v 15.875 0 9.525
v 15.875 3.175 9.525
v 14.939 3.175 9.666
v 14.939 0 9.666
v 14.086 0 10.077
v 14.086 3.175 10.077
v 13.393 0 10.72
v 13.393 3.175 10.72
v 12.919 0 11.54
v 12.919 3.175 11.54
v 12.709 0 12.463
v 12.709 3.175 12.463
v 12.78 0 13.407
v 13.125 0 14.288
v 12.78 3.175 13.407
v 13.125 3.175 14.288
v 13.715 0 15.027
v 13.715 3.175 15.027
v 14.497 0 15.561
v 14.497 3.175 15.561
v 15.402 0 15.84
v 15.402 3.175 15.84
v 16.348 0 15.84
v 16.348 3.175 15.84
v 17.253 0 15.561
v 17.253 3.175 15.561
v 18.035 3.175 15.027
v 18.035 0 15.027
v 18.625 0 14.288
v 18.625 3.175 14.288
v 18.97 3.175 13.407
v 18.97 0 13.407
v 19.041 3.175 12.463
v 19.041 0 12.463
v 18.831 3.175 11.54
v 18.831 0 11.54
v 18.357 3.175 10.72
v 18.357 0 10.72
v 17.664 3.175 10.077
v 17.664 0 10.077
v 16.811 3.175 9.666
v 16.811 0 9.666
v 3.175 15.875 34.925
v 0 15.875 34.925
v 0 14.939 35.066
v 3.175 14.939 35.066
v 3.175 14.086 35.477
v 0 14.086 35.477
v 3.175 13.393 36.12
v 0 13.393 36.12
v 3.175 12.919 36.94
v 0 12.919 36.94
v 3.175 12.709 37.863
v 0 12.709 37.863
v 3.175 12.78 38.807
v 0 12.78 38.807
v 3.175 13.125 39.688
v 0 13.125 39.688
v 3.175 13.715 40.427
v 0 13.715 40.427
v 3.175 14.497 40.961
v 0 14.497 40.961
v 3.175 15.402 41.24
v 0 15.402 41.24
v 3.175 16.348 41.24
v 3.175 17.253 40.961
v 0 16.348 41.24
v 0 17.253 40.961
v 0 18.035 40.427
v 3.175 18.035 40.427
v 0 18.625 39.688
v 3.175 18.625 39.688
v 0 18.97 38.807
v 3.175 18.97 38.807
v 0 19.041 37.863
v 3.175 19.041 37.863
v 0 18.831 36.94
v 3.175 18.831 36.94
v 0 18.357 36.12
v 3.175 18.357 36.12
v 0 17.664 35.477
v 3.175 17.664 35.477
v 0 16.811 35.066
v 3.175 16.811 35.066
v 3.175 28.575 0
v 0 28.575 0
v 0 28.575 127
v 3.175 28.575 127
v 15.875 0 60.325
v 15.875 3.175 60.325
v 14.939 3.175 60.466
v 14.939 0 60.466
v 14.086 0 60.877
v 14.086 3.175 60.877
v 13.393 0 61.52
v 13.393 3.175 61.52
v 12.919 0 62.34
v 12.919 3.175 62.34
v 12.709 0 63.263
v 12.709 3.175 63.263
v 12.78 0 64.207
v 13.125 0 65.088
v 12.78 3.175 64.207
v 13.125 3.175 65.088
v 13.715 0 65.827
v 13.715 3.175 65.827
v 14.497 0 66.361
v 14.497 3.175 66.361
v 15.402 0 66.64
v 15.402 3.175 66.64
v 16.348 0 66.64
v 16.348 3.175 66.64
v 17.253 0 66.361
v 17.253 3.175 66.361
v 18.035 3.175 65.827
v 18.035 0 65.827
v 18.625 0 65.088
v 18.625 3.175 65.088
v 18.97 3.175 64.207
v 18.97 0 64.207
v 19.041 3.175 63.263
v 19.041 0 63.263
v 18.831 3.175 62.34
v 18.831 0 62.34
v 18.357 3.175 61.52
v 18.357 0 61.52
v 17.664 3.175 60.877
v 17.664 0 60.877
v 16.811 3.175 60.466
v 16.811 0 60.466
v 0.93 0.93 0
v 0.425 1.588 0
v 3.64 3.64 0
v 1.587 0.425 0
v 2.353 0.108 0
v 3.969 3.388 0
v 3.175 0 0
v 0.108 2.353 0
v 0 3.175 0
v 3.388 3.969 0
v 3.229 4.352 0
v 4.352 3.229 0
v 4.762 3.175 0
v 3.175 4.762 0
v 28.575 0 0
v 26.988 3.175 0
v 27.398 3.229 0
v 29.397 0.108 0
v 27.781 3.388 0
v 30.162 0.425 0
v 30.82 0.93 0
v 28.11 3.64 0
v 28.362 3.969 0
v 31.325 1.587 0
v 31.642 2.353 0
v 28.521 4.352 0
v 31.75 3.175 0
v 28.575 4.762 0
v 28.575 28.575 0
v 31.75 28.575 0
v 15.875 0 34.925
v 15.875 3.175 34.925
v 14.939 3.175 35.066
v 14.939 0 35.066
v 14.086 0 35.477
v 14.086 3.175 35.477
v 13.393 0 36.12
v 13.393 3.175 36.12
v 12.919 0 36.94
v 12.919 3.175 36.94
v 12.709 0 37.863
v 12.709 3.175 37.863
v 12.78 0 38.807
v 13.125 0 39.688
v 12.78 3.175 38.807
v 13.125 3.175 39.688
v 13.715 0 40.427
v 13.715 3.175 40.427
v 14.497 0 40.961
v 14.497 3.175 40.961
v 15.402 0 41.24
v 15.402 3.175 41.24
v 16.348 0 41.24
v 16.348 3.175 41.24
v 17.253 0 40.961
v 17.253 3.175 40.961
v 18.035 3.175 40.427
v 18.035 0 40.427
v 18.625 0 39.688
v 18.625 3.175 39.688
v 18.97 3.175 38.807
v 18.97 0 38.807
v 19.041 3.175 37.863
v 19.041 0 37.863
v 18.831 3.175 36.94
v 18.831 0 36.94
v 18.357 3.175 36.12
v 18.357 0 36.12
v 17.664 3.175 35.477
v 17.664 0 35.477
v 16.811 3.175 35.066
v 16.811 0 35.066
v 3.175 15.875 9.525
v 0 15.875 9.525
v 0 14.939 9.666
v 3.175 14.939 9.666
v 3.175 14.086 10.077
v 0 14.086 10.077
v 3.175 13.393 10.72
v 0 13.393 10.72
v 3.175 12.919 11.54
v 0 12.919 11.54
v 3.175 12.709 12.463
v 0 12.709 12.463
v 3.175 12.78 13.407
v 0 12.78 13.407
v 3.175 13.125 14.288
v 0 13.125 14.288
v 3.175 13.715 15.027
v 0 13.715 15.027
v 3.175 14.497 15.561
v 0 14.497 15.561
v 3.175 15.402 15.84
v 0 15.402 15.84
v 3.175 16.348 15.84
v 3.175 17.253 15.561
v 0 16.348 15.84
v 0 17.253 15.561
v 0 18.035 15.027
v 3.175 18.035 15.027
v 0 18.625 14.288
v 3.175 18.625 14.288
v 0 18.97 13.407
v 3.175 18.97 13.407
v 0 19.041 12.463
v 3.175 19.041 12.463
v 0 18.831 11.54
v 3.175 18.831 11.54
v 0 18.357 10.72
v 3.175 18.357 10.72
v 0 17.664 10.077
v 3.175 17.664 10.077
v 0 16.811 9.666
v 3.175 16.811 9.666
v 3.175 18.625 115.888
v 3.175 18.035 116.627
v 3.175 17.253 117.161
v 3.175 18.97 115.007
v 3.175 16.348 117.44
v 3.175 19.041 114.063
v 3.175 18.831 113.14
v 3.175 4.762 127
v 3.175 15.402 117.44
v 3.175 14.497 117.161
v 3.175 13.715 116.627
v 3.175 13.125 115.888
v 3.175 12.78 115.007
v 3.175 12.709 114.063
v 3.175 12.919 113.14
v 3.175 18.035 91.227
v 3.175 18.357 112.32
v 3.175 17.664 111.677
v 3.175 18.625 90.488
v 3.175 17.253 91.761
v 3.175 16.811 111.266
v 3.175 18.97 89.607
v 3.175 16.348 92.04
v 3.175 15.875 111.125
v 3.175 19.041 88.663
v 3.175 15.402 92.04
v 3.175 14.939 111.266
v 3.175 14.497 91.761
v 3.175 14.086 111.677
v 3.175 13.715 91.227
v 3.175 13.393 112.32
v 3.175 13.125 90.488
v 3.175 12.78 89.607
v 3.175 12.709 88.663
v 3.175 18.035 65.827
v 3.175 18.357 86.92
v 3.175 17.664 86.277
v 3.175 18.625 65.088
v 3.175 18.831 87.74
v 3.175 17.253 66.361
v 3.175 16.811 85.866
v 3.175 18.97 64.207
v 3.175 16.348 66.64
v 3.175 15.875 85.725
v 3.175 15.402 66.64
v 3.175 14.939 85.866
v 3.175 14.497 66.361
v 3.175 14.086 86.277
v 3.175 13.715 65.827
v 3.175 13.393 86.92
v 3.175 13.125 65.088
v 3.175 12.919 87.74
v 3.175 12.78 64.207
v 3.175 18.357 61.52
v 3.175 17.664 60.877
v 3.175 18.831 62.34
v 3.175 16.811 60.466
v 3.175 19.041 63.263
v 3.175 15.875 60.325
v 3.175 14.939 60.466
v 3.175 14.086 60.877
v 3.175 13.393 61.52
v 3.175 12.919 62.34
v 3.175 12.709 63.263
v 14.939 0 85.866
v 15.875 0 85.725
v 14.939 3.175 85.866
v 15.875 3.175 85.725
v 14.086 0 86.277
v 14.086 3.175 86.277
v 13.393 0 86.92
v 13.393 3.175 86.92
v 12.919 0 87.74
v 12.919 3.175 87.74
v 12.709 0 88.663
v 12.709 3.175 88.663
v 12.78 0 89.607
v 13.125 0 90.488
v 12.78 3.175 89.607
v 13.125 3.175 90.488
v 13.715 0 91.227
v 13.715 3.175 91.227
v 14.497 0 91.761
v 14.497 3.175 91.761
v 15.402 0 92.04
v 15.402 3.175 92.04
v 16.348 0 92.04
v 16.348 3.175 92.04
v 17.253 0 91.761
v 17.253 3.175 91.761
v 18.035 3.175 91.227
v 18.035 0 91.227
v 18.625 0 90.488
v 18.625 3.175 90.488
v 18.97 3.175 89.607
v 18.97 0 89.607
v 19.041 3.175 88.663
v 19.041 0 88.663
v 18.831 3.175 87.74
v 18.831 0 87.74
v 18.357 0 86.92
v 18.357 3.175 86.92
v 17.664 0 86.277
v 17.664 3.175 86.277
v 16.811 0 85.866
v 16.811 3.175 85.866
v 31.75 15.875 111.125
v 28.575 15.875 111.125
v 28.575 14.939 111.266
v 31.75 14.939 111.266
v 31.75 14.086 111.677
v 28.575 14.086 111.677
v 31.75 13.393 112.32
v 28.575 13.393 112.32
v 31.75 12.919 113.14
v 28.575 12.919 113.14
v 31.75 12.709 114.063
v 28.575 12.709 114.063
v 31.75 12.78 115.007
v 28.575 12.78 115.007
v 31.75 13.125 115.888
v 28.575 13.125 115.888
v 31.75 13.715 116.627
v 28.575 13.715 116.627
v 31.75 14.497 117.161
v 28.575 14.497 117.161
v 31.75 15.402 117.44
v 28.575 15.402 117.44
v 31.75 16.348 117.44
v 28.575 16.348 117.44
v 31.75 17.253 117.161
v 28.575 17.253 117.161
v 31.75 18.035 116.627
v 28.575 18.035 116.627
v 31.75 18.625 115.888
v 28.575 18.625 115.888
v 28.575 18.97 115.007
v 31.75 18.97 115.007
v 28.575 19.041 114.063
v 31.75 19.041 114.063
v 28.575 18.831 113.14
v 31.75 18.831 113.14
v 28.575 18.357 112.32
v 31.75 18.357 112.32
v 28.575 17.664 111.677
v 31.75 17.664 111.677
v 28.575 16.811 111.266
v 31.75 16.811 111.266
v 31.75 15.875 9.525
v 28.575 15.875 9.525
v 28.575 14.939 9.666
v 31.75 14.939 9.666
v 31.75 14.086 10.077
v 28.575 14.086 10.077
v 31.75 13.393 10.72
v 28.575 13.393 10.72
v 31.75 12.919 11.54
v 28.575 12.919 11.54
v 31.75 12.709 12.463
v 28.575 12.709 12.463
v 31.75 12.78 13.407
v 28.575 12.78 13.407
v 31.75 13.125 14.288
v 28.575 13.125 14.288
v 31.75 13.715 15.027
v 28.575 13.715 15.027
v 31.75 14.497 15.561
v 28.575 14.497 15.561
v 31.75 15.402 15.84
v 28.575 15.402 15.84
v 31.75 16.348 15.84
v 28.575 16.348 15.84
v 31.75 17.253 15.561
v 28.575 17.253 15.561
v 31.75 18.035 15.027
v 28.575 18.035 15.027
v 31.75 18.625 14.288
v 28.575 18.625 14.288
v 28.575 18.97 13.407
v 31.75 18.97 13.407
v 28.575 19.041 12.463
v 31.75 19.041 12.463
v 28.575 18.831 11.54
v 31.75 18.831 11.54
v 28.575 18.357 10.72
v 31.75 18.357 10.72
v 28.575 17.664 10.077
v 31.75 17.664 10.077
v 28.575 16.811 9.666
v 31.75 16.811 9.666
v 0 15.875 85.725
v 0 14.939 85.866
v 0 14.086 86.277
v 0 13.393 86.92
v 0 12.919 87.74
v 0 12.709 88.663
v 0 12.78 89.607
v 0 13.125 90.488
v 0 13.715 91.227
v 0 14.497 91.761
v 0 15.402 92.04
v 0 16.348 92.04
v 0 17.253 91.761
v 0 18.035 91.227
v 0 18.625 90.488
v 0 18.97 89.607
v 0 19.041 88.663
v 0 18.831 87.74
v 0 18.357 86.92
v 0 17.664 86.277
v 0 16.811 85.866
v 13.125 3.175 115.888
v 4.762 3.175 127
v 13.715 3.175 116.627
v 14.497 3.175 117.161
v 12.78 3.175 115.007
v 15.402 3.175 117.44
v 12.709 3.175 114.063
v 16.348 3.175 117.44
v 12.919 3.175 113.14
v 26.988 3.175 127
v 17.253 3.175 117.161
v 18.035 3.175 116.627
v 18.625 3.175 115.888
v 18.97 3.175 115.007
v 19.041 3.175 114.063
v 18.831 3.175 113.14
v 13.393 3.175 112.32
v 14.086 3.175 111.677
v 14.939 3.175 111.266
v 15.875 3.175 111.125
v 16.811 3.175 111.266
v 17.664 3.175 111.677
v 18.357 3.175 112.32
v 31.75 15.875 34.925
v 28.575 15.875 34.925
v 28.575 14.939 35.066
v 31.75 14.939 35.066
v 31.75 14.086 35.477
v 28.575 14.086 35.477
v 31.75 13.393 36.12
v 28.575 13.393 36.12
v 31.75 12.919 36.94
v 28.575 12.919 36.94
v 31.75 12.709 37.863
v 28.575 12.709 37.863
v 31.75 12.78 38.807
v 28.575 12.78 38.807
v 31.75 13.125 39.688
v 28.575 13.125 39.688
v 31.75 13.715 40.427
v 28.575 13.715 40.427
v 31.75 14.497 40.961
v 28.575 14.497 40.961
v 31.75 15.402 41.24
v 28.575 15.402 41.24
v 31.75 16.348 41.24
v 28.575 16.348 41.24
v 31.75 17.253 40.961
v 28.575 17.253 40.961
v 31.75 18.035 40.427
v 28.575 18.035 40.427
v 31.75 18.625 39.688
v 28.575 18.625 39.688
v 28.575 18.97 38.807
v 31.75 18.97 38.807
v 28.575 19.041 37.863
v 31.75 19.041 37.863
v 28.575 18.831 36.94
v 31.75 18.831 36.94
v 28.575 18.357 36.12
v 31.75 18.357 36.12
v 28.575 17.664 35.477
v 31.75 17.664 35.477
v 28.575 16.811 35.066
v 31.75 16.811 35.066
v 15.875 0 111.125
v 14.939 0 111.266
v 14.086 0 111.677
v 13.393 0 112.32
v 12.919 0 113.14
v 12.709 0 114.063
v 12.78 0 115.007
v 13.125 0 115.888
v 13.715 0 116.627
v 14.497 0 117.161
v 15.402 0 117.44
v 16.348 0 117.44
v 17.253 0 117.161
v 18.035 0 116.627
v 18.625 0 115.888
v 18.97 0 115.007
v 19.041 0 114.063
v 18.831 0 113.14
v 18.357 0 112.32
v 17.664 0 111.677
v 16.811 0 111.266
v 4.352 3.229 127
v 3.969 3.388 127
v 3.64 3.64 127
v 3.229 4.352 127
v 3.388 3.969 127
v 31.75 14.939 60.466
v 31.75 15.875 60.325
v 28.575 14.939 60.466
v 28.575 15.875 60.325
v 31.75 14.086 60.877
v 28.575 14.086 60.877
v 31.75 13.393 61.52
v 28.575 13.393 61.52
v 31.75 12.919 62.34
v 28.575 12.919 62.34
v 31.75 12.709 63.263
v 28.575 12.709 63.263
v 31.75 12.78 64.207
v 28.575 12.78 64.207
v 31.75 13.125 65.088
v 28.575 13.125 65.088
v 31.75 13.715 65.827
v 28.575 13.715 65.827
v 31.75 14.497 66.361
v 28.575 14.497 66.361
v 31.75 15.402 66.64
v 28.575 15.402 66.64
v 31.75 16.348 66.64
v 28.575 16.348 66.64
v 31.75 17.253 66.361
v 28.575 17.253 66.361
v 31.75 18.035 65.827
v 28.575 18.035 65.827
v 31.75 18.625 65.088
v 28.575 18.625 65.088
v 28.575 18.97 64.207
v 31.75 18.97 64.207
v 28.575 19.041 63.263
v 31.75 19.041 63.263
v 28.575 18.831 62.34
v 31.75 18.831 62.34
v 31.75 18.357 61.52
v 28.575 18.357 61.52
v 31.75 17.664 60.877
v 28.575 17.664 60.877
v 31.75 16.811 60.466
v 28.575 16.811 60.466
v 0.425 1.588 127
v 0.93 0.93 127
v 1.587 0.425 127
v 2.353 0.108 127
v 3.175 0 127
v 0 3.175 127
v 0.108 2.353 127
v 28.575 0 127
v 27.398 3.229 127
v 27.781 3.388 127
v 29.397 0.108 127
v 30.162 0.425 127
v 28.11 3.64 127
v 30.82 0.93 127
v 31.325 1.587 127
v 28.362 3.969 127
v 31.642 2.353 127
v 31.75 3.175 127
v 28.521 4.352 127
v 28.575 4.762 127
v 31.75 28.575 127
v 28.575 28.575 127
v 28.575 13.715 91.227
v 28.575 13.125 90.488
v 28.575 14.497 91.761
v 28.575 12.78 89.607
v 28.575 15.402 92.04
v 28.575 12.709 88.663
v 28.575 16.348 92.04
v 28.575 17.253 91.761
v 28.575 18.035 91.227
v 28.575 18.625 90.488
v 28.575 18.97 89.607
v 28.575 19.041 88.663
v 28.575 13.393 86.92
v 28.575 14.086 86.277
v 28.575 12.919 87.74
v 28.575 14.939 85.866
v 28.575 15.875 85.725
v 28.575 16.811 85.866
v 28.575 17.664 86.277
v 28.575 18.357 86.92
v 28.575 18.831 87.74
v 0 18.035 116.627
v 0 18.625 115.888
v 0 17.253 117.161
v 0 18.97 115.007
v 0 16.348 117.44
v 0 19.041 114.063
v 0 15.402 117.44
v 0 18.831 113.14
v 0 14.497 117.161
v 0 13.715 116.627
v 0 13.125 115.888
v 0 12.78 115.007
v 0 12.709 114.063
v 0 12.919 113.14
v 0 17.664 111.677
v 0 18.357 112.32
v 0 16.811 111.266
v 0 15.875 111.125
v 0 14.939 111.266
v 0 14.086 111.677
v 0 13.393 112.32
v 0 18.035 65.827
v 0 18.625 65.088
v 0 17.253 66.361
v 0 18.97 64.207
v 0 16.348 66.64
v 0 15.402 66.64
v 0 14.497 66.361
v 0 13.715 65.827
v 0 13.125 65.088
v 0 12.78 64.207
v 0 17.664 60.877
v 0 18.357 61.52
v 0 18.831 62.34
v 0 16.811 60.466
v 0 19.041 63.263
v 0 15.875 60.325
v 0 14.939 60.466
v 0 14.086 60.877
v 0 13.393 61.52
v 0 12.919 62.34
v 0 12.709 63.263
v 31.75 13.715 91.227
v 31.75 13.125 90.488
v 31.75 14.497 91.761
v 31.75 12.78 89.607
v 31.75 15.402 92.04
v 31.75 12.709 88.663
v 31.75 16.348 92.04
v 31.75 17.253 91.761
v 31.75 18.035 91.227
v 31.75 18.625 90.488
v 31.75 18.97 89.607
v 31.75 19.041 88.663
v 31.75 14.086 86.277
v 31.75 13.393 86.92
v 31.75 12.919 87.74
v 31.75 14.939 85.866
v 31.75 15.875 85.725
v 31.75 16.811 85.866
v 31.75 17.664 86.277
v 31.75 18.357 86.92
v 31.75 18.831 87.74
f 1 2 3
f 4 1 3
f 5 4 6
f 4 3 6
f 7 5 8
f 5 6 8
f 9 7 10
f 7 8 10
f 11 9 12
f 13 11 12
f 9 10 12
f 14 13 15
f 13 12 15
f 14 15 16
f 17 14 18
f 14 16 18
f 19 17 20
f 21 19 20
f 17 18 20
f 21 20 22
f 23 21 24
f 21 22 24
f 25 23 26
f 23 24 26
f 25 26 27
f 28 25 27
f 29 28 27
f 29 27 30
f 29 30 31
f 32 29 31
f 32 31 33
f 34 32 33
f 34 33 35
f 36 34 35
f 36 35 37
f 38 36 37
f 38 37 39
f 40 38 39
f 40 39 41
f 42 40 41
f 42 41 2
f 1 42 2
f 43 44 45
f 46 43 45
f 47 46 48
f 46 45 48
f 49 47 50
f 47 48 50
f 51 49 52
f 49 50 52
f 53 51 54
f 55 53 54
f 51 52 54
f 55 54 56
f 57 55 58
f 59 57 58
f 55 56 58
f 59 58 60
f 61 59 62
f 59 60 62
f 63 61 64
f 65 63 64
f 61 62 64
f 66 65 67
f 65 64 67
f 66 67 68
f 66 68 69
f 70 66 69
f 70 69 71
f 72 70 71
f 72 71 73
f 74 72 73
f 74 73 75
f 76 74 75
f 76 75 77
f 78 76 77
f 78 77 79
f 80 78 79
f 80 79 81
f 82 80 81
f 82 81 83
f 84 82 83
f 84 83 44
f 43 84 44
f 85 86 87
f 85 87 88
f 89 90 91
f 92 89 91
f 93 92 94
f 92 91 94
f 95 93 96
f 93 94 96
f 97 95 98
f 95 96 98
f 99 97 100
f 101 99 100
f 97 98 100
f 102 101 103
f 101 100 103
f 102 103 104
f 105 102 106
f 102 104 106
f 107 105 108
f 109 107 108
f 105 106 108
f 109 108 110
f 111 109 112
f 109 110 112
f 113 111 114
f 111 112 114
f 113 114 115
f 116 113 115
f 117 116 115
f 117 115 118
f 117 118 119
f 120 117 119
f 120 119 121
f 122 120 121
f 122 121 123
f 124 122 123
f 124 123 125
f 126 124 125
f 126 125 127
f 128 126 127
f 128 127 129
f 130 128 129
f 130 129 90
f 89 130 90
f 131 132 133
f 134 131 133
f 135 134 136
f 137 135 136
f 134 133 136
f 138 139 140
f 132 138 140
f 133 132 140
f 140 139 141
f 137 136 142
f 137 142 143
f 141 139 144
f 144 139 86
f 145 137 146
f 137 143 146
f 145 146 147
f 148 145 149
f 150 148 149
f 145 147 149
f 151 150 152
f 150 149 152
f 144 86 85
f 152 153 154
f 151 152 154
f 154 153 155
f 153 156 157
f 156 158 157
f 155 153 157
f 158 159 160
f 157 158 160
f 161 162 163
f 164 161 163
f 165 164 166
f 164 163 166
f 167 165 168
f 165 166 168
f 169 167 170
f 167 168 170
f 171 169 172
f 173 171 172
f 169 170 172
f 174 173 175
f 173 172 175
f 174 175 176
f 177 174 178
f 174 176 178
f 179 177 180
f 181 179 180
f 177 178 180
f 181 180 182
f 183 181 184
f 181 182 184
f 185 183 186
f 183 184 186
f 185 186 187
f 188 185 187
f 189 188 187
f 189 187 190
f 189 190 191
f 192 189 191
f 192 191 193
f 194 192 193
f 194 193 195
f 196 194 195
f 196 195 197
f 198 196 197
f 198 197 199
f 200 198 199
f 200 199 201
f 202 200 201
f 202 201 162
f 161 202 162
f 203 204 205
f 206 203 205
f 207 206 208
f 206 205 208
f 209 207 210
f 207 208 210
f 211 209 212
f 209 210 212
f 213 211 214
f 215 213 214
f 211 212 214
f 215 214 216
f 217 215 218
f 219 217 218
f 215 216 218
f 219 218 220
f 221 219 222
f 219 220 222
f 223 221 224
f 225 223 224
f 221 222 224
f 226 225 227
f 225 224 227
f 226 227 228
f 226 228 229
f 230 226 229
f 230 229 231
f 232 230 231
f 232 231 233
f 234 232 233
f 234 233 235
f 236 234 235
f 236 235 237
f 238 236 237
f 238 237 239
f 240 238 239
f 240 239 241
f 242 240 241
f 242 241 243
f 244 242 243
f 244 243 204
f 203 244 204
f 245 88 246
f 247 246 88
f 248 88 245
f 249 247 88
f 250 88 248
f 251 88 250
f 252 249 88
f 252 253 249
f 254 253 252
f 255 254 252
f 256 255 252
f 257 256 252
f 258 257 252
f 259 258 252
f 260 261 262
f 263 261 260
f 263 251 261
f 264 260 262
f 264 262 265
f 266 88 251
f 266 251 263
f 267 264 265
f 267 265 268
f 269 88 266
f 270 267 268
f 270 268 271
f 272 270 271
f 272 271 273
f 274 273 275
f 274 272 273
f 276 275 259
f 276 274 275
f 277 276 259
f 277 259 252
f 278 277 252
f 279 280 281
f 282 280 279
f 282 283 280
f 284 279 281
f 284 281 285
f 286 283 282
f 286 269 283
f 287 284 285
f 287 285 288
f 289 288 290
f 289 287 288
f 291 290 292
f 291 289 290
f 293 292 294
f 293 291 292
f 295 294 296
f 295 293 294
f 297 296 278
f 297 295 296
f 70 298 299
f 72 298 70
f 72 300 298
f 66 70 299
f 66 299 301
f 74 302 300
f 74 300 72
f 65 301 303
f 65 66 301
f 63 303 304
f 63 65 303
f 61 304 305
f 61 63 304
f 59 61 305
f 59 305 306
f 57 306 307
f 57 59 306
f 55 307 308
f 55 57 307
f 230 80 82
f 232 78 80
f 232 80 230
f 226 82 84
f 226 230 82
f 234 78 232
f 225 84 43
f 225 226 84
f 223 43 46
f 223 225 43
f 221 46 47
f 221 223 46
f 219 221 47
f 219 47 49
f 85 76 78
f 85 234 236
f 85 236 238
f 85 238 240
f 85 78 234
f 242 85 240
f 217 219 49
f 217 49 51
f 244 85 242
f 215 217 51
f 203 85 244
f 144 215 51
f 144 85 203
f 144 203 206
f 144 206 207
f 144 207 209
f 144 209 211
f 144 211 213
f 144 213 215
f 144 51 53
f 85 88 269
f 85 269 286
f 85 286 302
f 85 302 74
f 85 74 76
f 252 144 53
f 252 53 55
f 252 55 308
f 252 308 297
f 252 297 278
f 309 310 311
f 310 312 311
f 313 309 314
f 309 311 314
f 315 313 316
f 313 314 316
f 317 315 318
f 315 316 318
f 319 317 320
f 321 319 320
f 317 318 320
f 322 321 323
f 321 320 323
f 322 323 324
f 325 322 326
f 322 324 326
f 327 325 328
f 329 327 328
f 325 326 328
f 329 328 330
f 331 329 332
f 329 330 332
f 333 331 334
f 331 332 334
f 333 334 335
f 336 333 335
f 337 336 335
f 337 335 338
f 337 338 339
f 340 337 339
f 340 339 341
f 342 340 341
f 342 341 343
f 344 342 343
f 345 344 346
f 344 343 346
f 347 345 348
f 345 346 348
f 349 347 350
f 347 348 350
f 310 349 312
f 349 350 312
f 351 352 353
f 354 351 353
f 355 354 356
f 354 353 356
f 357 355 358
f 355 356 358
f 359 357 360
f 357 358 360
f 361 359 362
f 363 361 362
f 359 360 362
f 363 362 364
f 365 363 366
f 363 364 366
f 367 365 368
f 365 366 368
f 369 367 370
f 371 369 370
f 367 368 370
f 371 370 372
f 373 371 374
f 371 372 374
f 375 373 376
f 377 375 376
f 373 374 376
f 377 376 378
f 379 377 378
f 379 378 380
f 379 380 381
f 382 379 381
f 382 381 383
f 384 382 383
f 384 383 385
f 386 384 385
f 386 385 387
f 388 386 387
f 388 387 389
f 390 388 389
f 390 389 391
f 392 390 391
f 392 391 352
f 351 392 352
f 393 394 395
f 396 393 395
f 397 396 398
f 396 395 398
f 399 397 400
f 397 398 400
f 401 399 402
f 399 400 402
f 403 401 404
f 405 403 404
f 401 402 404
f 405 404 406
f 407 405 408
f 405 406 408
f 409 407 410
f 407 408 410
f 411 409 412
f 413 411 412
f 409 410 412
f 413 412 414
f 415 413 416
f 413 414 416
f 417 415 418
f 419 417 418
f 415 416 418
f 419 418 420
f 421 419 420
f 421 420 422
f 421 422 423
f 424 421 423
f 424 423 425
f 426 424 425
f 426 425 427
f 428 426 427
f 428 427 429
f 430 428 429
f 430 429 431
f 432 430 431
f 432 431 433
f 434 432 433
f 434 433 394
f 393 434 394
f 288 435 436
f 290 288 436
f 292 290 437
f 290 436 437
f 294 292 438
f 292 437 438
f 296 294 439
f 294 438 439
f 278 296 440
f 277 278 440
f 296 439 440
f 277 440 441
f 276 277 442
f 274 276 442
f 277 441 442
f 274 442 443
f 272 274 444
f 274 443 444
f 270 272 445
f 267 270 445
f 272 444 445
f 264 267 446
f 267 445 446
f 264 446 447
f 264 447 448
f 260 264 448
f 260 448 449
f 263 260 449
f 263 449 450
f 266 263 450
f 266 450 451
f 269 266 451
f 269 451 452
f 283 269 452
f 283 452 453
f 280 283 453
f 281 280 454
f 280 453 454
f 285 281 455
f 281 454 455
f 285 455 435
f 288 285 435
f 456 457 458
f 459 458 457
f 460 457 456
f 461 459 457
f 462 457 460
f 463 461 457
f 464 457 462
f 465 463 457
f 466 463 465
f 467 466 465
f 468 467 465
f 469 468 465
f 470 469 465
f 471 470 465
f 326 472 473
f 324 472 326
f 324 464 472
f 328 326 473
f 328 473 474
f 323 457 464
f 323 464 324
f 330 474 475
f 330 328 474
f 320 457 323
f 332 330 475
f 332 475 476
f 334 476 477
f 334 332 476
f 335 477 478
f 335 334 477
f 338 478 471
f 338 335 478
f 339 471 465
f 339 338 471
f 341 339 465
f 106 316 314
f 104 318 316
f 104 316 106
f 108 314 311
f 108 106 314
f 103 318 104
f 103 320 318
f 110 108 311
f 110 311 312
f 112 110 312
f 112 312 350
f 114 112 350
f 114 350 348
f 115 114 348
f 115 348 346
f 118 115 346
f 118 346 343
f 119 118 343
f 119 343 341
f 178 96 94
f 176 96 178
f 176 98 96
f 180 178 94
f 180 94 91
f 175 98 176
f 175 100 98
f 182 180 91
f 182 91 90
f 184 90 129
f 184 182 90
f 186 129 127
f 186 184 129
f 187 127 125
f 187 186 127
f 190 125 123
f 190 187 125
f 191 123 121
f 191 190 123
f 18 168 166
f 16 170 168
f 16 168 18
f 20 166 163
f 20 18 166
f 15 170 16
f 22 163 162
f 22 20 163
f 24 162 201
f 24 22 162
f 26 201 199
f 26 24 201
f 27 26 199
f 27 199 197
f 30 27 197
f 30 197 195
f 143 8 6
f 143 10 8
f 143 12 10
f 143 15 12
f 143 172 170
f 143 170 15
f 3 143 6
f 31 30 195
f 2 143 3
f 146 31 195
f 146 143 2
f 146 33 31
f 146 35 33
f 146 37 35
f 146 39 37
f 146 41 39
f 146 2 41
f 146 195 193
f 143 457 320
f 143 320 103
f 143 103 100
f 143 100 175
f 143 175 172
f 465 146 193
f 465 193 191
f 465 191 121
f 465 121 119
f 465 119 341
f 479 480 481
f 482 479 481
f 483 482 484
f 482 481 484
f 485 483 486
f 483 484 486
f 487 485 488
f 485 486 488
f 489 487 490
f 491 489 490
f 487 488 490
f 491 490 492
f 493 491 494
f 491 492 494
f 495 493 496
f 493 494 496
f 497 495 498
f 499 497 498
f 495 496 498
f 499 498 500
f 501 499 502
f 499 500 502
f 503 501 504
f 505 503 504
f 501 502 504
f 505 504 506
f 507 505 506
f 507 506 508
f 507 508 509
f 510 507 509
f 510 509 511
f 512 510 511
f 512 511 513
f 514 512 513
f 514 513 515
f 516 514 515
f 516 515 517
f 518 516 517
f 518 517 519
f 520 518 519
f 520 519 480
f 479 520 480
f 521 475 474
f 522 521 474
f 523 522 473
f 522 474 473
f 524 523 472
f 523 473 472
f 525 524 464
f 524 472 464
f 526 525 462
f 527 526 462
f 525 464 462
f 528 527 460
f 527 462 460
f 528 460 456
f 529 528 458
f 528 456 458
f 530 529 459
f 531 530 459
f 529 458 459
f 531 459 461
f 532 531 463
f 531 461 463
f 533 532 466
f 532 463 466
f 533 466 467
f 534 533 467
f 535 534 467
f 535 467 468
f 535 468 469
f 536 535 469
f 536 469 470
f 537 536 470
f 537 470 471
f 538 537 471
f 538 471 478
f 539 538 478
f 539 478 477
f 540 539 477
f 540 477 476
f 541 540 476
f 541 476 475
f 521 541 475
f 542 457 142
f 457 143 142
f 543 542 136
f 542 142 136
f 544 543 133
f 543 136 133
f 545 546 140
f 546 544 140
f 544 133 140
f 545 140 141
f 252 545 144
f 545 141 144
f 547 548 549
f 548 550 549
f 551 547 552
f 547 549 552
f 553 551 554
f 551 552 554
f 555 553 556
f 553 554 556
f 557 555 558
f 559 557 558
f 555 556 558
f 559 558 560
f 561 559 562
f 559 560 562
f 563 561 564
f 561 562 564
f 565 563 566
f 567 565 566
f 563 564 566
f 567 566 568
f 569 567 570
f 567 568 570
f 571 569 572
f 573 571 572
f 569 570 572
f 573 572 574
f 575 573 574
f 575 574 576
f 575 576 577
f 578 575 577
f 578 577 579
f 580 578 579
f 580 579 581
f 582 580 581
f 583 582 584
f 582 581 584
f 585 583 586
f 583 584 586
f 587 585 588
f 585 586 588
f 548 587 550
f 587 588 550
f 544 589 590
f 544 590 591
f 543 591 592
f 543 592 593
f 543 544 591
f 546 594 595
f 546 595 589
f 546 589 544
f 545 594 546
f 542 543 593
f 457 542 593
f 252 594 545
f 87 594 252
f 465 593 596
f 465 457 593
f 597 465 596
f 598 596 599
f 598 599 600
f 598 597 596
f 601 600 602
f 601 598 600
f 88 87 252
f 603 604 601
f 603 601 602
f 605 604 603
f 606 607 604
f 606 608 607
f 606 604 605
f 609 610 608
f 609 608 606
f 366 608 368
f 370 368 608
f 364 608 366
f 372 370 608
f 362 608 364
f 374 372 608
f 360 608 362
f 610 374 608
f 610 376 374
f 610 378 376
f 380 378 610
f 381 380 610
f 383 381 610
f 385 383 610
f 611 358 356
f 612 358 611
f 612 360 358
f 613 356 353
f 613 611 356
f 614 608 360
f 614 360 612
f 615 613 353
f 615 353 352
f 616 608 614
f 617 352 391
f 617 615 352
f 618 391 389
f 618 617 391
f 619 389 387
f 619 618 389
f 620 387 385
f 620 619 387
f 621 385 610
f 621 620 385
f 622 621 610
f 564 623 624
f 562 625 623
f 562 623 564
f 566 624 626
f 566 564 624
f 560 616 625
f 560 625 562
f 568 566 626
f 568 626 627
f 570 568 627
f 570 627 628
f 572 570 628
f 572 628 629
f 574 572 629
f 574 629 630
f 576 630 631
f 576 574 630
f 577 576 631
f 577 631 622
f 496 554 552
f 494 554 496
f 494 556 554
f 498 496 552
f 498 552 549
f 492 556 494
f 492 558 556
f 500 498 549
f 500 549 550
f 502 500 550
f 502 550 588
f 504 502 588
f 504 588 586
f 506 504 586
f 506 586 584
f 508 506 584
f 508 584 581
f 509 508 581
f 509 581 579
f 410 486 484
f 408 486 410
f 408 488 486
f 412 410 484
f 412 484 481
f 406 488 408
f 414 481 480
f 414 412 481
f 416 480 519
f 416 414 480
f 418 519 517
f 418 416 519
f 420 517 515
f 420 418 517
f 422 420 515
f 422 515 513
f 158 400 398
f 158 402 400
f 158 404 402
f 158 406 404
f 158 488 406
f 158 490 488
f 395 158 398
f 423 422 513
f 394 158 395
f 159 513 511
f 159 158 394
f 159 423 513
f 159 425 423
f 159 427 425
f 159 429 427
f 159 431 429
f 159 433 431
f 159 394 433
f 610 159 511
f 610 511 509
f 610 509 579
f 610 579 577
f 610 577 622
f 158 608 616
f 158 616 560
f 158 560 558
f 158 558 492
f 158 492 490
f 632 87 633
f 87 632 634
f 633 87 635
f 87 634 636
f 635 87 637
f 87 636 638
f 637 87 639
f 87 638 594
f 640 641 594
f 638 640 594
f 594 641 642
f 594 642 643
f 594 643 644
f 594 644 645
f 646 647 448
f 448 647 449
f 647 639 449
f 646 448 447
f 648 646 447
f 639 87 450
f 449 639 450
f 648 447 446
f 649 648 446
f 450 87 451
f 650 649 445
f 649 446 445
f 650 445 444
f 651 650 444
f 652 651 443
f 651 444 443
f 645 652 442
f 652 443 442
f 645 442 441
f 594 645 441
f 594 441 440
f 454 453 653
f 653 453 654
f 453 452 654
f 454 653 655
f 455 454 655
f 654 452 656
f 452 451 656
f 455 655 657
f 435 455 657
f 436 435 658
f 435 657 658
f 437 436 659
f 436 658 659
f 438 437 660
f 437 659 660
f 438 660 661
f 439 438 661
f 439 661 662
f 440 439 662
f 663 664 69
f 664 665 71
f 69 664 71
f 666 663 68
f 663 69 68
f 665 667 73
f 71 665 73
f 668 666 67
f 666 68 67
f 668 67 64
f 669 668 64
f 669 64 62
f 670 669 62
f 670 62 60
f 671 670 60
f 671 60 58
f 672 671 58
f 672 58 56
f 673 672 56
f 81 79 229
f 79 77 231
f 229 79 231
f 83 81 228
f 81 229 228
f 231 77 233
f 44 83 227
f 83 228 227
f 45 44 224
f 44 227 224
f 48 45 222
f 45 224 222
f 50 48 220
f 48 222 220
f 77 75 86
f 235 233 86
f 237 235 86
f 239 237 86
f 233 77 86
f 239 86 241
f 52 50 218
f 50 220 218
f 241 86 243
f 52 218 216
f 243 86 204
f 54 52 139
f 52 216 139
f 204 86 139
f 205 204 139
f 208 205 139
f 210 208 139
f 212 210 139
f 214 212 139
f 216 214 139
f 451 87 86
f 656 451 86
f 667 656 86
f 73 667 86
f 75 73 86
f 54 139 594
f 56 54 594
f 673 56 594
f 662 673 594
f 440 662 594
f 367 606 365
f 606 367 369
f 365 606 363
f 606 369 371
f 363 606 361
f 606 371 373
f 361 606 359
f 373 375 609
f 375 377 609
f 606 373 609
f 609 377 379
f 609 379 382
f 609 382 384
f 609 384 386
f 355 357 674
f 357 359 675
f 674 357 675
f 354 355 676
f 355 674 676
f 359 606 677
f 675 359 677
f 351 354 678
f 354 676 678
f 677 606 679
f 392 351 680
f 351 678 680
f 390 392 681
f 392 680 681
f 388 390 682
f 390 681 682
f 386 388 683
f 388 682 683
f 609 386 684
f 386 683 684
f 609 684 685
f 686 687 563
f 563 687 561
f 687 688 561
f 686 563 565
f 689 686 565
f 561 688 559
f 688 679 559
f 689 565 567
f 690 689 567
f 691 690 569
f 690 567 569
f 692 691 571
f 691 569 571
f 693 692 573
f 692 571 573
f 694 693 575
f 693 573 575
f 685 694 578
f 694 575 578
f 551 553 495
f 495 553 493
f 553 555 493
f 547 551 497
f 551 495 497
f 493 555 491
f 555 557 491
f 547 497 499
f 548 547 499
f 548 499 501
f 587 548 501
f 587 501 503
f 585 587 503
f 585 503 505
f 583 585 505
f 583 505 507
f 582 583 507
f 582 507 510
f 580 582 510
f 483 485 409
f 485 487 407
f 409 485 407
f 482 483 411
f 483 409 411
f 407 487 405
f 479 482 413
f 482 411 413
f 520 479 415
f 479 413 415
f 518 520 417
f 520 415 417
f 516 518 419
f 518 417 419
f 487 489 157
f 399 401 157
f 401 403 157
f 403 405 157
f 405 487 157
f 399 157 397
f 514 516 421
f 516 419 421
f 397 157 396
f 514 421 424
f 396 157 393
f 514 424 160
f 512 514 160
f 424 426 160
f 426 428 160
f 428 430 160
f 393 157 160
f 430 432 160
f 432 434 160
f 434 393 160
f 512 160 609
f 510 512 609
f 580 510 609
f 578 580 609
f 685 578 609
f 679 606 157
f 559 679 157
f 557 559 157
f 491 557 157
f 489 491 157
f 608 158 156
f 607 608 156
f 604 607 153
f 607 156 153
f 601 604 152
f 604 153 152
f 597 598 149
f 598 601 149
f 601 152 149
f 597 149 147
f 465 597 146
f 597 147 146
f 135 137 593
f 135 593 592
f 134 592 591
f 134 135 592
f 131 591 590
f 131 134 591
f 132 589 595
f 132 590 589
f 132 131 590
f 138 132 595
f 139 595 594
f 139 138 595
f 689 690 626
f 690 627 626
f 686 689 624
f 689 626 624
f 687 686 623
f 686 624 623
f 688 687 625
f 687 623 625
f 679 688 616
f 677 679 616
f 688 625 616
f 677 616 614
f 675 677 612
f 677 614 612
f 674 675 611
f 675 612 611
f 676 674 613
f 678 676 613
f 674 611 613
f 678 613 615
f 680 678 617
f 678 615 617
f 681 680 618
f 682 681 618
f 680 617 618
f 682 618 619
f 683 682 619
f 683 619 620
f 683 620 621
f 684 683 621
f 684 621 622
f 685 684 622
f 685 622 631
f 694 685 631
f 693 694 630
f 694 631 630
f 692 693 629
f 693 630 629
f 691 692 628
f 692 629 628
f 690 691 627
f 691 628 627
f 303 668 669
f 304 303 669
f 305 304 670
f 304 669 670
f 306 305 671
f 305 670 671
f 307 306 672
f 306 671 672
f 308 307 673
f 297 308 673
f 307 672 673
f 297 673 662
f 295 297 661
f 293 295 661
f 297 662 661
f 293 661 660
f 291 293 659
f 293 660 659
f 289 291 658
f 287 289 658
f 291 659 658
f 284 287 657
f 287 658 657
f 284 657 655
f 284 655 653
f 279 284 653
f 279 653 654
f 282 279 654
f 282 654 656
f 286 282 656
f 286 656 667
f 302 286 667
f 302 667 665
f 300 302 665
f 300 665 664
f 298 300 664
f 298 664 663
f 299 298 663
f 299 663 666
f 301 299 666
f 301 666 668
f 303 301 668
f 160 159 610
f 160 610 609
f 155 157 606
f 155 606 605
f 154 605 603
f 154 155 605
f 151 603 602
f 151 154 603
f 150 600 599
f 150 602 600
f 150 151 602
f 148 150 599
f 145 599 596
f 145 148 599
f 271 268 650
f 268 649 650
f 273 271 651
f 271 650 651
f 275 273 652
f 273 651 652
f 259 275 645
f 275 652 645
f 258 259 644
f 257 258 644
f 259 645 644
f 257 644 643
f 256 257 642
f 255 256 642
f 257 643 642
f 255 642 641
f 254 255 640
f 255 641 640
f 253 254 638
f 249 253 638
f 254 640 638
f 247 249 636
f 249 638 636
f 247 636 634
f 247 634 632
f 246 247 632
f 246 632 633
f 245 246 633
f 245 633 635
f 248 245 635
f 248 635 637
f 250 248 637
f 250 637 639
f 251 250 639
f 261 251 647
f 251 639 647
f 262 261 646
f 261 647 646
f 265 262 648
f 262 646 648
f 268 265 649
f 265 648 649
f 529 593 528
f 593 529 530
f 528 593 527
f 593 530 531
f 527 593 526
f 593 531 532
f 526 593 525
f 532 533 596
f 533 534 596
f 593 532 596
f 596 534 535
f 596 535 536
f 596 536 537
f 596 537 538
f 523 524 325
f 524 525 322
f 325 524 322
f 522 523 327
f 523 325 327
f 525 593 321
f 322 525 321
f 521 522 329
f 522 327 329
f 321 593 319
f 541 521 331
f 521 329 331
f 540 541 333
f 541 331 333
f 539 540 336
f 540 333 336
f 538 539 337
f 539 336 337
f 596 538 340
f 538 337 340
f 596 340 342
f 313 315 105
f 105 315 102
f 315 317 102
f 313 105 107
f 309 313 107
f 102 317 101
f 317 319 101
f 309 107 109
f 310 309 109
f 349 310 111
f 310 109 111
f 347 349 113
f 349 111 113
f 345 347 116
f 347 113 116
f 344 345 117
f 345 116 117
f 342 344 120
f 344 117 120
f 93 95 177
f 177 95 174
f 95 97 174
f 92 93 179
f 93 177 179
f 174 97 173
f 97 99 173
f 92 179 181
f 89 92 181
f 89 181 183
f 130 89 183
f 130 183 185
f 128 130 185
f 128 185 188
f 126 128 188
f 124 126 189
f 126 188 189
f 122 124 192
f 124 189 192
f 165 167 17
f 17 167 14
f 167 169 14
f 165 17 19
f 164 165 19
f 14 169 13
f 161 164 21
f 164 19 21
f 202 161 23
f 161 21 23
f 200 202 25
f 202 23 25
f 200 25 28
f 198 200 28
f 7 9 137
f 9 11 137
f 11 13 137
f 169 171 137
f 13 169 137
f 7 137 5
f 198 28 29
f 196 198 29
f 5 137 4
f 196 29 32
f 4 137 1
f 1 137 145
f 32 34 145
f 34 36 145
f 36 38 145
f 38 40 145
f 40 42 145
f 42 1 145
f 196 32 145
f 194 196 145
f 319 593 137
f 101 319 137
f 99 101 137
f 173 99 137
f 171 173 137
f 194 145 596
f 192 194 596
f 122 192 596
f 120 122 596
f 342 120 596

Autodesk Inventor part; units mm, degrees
ref_plane "YZ Plane" through (0, 0, 0) normal (1, 0, 0) x (0, 1, 0)
ref_plane "XZ Plane" through (0, 0, 0) normal (0, 1, 0) x (-1, 0, 0)
ref_plane "XY Plane" through (0, 0, 0) normal (0, 0, 1) x (1, 0, 0)
sketch "Sketch1" plane through (0, 0, 0) normal (0, 0, 1) x (1, 0, 0)
  line L0 (3.175, 0) -> (28.575, 0)
  line L1 (31.75, 3.175) -> (31.75, 28.575)
  line L2 (0, 28.575) -> (0, 3.175)
  line L3 (4.7625, 3.175) -> (26.9875, 3.175)
  line L4 (28.575, 4.7625) -> (28.575, 28.575)
  line L5 (3.175, 28.575) -> (3.175, 4.7625)
  line L6 (0, 28.575) -> (3.175, 28.575)
  line L7 (28.575, 28.575) -> (31.75, 28.575)
  arc A0 (3.175, 4.7625) -> (4.7625, 3.175) centre (4.7625, 4.7625) ccw
  arc A1 (26.9875, 3.175) -> (28.575, 4.7625) centre (26.9875, 4.7625) ccw
  arc A2 (0, 3.175) -> (3.175, 0) centre (3.175, 3.175) ccw
  arc A3 (28.575, 0) -> (31.75, 3.175) centre (28.575, 3.175) ccw
  point P0 (0, 0)
  point P1 (0, 0)
  point P2 (31.75, 0)
  dimension "d0" = 31.75
  dimension "d1" = 28.575
  dimension "d2" = 1.5875
  dimension "d3" = 3.175
extrude "Extrusion1" add sketch "Sketch1" along normal blind 127
sketch "Sketch2" plane through (31.75, 3.175, 0) normal (1, 0, 0) x (0, 0, -1)
  line L0 (-127, 0) -> (-127, 25.4) projected
  line L1 (0, 0) -> (-127, 0) projected
  line L2 (-127, 12.7) -> (-114.3, 12.7)
  point P0 (0, -3.175)
  dimension "d6" = 12.7
sketch "Sketch3" plane through (3.175, 0, 0) normal (0, -1, 0) x (1, 0, 0)
  line L0 (0, 127) -> (25.4, 127) projected
  line L1 (0, 0) -> (0, 127) projected
  line L2 (12.7, 127) -> (12.7, 114.3)
  point P0 (-3.175, 0)
  dimension "d7" = 12.7
hole "Hole1" at (31.75, 15.875, 114.3) direction (-1, 0, 0) diameter 6.35 end through all
hole "Hole2" at (15.875, 0, 114.3) direction (0, 1, 0) diameter 6.35 end through all
pattern_linear "Rectangular Pattern1" count 5 spacing 25.4 along (0, 0, -1) of "Hole1", "Hole2"
properties part number "5 in bar"
